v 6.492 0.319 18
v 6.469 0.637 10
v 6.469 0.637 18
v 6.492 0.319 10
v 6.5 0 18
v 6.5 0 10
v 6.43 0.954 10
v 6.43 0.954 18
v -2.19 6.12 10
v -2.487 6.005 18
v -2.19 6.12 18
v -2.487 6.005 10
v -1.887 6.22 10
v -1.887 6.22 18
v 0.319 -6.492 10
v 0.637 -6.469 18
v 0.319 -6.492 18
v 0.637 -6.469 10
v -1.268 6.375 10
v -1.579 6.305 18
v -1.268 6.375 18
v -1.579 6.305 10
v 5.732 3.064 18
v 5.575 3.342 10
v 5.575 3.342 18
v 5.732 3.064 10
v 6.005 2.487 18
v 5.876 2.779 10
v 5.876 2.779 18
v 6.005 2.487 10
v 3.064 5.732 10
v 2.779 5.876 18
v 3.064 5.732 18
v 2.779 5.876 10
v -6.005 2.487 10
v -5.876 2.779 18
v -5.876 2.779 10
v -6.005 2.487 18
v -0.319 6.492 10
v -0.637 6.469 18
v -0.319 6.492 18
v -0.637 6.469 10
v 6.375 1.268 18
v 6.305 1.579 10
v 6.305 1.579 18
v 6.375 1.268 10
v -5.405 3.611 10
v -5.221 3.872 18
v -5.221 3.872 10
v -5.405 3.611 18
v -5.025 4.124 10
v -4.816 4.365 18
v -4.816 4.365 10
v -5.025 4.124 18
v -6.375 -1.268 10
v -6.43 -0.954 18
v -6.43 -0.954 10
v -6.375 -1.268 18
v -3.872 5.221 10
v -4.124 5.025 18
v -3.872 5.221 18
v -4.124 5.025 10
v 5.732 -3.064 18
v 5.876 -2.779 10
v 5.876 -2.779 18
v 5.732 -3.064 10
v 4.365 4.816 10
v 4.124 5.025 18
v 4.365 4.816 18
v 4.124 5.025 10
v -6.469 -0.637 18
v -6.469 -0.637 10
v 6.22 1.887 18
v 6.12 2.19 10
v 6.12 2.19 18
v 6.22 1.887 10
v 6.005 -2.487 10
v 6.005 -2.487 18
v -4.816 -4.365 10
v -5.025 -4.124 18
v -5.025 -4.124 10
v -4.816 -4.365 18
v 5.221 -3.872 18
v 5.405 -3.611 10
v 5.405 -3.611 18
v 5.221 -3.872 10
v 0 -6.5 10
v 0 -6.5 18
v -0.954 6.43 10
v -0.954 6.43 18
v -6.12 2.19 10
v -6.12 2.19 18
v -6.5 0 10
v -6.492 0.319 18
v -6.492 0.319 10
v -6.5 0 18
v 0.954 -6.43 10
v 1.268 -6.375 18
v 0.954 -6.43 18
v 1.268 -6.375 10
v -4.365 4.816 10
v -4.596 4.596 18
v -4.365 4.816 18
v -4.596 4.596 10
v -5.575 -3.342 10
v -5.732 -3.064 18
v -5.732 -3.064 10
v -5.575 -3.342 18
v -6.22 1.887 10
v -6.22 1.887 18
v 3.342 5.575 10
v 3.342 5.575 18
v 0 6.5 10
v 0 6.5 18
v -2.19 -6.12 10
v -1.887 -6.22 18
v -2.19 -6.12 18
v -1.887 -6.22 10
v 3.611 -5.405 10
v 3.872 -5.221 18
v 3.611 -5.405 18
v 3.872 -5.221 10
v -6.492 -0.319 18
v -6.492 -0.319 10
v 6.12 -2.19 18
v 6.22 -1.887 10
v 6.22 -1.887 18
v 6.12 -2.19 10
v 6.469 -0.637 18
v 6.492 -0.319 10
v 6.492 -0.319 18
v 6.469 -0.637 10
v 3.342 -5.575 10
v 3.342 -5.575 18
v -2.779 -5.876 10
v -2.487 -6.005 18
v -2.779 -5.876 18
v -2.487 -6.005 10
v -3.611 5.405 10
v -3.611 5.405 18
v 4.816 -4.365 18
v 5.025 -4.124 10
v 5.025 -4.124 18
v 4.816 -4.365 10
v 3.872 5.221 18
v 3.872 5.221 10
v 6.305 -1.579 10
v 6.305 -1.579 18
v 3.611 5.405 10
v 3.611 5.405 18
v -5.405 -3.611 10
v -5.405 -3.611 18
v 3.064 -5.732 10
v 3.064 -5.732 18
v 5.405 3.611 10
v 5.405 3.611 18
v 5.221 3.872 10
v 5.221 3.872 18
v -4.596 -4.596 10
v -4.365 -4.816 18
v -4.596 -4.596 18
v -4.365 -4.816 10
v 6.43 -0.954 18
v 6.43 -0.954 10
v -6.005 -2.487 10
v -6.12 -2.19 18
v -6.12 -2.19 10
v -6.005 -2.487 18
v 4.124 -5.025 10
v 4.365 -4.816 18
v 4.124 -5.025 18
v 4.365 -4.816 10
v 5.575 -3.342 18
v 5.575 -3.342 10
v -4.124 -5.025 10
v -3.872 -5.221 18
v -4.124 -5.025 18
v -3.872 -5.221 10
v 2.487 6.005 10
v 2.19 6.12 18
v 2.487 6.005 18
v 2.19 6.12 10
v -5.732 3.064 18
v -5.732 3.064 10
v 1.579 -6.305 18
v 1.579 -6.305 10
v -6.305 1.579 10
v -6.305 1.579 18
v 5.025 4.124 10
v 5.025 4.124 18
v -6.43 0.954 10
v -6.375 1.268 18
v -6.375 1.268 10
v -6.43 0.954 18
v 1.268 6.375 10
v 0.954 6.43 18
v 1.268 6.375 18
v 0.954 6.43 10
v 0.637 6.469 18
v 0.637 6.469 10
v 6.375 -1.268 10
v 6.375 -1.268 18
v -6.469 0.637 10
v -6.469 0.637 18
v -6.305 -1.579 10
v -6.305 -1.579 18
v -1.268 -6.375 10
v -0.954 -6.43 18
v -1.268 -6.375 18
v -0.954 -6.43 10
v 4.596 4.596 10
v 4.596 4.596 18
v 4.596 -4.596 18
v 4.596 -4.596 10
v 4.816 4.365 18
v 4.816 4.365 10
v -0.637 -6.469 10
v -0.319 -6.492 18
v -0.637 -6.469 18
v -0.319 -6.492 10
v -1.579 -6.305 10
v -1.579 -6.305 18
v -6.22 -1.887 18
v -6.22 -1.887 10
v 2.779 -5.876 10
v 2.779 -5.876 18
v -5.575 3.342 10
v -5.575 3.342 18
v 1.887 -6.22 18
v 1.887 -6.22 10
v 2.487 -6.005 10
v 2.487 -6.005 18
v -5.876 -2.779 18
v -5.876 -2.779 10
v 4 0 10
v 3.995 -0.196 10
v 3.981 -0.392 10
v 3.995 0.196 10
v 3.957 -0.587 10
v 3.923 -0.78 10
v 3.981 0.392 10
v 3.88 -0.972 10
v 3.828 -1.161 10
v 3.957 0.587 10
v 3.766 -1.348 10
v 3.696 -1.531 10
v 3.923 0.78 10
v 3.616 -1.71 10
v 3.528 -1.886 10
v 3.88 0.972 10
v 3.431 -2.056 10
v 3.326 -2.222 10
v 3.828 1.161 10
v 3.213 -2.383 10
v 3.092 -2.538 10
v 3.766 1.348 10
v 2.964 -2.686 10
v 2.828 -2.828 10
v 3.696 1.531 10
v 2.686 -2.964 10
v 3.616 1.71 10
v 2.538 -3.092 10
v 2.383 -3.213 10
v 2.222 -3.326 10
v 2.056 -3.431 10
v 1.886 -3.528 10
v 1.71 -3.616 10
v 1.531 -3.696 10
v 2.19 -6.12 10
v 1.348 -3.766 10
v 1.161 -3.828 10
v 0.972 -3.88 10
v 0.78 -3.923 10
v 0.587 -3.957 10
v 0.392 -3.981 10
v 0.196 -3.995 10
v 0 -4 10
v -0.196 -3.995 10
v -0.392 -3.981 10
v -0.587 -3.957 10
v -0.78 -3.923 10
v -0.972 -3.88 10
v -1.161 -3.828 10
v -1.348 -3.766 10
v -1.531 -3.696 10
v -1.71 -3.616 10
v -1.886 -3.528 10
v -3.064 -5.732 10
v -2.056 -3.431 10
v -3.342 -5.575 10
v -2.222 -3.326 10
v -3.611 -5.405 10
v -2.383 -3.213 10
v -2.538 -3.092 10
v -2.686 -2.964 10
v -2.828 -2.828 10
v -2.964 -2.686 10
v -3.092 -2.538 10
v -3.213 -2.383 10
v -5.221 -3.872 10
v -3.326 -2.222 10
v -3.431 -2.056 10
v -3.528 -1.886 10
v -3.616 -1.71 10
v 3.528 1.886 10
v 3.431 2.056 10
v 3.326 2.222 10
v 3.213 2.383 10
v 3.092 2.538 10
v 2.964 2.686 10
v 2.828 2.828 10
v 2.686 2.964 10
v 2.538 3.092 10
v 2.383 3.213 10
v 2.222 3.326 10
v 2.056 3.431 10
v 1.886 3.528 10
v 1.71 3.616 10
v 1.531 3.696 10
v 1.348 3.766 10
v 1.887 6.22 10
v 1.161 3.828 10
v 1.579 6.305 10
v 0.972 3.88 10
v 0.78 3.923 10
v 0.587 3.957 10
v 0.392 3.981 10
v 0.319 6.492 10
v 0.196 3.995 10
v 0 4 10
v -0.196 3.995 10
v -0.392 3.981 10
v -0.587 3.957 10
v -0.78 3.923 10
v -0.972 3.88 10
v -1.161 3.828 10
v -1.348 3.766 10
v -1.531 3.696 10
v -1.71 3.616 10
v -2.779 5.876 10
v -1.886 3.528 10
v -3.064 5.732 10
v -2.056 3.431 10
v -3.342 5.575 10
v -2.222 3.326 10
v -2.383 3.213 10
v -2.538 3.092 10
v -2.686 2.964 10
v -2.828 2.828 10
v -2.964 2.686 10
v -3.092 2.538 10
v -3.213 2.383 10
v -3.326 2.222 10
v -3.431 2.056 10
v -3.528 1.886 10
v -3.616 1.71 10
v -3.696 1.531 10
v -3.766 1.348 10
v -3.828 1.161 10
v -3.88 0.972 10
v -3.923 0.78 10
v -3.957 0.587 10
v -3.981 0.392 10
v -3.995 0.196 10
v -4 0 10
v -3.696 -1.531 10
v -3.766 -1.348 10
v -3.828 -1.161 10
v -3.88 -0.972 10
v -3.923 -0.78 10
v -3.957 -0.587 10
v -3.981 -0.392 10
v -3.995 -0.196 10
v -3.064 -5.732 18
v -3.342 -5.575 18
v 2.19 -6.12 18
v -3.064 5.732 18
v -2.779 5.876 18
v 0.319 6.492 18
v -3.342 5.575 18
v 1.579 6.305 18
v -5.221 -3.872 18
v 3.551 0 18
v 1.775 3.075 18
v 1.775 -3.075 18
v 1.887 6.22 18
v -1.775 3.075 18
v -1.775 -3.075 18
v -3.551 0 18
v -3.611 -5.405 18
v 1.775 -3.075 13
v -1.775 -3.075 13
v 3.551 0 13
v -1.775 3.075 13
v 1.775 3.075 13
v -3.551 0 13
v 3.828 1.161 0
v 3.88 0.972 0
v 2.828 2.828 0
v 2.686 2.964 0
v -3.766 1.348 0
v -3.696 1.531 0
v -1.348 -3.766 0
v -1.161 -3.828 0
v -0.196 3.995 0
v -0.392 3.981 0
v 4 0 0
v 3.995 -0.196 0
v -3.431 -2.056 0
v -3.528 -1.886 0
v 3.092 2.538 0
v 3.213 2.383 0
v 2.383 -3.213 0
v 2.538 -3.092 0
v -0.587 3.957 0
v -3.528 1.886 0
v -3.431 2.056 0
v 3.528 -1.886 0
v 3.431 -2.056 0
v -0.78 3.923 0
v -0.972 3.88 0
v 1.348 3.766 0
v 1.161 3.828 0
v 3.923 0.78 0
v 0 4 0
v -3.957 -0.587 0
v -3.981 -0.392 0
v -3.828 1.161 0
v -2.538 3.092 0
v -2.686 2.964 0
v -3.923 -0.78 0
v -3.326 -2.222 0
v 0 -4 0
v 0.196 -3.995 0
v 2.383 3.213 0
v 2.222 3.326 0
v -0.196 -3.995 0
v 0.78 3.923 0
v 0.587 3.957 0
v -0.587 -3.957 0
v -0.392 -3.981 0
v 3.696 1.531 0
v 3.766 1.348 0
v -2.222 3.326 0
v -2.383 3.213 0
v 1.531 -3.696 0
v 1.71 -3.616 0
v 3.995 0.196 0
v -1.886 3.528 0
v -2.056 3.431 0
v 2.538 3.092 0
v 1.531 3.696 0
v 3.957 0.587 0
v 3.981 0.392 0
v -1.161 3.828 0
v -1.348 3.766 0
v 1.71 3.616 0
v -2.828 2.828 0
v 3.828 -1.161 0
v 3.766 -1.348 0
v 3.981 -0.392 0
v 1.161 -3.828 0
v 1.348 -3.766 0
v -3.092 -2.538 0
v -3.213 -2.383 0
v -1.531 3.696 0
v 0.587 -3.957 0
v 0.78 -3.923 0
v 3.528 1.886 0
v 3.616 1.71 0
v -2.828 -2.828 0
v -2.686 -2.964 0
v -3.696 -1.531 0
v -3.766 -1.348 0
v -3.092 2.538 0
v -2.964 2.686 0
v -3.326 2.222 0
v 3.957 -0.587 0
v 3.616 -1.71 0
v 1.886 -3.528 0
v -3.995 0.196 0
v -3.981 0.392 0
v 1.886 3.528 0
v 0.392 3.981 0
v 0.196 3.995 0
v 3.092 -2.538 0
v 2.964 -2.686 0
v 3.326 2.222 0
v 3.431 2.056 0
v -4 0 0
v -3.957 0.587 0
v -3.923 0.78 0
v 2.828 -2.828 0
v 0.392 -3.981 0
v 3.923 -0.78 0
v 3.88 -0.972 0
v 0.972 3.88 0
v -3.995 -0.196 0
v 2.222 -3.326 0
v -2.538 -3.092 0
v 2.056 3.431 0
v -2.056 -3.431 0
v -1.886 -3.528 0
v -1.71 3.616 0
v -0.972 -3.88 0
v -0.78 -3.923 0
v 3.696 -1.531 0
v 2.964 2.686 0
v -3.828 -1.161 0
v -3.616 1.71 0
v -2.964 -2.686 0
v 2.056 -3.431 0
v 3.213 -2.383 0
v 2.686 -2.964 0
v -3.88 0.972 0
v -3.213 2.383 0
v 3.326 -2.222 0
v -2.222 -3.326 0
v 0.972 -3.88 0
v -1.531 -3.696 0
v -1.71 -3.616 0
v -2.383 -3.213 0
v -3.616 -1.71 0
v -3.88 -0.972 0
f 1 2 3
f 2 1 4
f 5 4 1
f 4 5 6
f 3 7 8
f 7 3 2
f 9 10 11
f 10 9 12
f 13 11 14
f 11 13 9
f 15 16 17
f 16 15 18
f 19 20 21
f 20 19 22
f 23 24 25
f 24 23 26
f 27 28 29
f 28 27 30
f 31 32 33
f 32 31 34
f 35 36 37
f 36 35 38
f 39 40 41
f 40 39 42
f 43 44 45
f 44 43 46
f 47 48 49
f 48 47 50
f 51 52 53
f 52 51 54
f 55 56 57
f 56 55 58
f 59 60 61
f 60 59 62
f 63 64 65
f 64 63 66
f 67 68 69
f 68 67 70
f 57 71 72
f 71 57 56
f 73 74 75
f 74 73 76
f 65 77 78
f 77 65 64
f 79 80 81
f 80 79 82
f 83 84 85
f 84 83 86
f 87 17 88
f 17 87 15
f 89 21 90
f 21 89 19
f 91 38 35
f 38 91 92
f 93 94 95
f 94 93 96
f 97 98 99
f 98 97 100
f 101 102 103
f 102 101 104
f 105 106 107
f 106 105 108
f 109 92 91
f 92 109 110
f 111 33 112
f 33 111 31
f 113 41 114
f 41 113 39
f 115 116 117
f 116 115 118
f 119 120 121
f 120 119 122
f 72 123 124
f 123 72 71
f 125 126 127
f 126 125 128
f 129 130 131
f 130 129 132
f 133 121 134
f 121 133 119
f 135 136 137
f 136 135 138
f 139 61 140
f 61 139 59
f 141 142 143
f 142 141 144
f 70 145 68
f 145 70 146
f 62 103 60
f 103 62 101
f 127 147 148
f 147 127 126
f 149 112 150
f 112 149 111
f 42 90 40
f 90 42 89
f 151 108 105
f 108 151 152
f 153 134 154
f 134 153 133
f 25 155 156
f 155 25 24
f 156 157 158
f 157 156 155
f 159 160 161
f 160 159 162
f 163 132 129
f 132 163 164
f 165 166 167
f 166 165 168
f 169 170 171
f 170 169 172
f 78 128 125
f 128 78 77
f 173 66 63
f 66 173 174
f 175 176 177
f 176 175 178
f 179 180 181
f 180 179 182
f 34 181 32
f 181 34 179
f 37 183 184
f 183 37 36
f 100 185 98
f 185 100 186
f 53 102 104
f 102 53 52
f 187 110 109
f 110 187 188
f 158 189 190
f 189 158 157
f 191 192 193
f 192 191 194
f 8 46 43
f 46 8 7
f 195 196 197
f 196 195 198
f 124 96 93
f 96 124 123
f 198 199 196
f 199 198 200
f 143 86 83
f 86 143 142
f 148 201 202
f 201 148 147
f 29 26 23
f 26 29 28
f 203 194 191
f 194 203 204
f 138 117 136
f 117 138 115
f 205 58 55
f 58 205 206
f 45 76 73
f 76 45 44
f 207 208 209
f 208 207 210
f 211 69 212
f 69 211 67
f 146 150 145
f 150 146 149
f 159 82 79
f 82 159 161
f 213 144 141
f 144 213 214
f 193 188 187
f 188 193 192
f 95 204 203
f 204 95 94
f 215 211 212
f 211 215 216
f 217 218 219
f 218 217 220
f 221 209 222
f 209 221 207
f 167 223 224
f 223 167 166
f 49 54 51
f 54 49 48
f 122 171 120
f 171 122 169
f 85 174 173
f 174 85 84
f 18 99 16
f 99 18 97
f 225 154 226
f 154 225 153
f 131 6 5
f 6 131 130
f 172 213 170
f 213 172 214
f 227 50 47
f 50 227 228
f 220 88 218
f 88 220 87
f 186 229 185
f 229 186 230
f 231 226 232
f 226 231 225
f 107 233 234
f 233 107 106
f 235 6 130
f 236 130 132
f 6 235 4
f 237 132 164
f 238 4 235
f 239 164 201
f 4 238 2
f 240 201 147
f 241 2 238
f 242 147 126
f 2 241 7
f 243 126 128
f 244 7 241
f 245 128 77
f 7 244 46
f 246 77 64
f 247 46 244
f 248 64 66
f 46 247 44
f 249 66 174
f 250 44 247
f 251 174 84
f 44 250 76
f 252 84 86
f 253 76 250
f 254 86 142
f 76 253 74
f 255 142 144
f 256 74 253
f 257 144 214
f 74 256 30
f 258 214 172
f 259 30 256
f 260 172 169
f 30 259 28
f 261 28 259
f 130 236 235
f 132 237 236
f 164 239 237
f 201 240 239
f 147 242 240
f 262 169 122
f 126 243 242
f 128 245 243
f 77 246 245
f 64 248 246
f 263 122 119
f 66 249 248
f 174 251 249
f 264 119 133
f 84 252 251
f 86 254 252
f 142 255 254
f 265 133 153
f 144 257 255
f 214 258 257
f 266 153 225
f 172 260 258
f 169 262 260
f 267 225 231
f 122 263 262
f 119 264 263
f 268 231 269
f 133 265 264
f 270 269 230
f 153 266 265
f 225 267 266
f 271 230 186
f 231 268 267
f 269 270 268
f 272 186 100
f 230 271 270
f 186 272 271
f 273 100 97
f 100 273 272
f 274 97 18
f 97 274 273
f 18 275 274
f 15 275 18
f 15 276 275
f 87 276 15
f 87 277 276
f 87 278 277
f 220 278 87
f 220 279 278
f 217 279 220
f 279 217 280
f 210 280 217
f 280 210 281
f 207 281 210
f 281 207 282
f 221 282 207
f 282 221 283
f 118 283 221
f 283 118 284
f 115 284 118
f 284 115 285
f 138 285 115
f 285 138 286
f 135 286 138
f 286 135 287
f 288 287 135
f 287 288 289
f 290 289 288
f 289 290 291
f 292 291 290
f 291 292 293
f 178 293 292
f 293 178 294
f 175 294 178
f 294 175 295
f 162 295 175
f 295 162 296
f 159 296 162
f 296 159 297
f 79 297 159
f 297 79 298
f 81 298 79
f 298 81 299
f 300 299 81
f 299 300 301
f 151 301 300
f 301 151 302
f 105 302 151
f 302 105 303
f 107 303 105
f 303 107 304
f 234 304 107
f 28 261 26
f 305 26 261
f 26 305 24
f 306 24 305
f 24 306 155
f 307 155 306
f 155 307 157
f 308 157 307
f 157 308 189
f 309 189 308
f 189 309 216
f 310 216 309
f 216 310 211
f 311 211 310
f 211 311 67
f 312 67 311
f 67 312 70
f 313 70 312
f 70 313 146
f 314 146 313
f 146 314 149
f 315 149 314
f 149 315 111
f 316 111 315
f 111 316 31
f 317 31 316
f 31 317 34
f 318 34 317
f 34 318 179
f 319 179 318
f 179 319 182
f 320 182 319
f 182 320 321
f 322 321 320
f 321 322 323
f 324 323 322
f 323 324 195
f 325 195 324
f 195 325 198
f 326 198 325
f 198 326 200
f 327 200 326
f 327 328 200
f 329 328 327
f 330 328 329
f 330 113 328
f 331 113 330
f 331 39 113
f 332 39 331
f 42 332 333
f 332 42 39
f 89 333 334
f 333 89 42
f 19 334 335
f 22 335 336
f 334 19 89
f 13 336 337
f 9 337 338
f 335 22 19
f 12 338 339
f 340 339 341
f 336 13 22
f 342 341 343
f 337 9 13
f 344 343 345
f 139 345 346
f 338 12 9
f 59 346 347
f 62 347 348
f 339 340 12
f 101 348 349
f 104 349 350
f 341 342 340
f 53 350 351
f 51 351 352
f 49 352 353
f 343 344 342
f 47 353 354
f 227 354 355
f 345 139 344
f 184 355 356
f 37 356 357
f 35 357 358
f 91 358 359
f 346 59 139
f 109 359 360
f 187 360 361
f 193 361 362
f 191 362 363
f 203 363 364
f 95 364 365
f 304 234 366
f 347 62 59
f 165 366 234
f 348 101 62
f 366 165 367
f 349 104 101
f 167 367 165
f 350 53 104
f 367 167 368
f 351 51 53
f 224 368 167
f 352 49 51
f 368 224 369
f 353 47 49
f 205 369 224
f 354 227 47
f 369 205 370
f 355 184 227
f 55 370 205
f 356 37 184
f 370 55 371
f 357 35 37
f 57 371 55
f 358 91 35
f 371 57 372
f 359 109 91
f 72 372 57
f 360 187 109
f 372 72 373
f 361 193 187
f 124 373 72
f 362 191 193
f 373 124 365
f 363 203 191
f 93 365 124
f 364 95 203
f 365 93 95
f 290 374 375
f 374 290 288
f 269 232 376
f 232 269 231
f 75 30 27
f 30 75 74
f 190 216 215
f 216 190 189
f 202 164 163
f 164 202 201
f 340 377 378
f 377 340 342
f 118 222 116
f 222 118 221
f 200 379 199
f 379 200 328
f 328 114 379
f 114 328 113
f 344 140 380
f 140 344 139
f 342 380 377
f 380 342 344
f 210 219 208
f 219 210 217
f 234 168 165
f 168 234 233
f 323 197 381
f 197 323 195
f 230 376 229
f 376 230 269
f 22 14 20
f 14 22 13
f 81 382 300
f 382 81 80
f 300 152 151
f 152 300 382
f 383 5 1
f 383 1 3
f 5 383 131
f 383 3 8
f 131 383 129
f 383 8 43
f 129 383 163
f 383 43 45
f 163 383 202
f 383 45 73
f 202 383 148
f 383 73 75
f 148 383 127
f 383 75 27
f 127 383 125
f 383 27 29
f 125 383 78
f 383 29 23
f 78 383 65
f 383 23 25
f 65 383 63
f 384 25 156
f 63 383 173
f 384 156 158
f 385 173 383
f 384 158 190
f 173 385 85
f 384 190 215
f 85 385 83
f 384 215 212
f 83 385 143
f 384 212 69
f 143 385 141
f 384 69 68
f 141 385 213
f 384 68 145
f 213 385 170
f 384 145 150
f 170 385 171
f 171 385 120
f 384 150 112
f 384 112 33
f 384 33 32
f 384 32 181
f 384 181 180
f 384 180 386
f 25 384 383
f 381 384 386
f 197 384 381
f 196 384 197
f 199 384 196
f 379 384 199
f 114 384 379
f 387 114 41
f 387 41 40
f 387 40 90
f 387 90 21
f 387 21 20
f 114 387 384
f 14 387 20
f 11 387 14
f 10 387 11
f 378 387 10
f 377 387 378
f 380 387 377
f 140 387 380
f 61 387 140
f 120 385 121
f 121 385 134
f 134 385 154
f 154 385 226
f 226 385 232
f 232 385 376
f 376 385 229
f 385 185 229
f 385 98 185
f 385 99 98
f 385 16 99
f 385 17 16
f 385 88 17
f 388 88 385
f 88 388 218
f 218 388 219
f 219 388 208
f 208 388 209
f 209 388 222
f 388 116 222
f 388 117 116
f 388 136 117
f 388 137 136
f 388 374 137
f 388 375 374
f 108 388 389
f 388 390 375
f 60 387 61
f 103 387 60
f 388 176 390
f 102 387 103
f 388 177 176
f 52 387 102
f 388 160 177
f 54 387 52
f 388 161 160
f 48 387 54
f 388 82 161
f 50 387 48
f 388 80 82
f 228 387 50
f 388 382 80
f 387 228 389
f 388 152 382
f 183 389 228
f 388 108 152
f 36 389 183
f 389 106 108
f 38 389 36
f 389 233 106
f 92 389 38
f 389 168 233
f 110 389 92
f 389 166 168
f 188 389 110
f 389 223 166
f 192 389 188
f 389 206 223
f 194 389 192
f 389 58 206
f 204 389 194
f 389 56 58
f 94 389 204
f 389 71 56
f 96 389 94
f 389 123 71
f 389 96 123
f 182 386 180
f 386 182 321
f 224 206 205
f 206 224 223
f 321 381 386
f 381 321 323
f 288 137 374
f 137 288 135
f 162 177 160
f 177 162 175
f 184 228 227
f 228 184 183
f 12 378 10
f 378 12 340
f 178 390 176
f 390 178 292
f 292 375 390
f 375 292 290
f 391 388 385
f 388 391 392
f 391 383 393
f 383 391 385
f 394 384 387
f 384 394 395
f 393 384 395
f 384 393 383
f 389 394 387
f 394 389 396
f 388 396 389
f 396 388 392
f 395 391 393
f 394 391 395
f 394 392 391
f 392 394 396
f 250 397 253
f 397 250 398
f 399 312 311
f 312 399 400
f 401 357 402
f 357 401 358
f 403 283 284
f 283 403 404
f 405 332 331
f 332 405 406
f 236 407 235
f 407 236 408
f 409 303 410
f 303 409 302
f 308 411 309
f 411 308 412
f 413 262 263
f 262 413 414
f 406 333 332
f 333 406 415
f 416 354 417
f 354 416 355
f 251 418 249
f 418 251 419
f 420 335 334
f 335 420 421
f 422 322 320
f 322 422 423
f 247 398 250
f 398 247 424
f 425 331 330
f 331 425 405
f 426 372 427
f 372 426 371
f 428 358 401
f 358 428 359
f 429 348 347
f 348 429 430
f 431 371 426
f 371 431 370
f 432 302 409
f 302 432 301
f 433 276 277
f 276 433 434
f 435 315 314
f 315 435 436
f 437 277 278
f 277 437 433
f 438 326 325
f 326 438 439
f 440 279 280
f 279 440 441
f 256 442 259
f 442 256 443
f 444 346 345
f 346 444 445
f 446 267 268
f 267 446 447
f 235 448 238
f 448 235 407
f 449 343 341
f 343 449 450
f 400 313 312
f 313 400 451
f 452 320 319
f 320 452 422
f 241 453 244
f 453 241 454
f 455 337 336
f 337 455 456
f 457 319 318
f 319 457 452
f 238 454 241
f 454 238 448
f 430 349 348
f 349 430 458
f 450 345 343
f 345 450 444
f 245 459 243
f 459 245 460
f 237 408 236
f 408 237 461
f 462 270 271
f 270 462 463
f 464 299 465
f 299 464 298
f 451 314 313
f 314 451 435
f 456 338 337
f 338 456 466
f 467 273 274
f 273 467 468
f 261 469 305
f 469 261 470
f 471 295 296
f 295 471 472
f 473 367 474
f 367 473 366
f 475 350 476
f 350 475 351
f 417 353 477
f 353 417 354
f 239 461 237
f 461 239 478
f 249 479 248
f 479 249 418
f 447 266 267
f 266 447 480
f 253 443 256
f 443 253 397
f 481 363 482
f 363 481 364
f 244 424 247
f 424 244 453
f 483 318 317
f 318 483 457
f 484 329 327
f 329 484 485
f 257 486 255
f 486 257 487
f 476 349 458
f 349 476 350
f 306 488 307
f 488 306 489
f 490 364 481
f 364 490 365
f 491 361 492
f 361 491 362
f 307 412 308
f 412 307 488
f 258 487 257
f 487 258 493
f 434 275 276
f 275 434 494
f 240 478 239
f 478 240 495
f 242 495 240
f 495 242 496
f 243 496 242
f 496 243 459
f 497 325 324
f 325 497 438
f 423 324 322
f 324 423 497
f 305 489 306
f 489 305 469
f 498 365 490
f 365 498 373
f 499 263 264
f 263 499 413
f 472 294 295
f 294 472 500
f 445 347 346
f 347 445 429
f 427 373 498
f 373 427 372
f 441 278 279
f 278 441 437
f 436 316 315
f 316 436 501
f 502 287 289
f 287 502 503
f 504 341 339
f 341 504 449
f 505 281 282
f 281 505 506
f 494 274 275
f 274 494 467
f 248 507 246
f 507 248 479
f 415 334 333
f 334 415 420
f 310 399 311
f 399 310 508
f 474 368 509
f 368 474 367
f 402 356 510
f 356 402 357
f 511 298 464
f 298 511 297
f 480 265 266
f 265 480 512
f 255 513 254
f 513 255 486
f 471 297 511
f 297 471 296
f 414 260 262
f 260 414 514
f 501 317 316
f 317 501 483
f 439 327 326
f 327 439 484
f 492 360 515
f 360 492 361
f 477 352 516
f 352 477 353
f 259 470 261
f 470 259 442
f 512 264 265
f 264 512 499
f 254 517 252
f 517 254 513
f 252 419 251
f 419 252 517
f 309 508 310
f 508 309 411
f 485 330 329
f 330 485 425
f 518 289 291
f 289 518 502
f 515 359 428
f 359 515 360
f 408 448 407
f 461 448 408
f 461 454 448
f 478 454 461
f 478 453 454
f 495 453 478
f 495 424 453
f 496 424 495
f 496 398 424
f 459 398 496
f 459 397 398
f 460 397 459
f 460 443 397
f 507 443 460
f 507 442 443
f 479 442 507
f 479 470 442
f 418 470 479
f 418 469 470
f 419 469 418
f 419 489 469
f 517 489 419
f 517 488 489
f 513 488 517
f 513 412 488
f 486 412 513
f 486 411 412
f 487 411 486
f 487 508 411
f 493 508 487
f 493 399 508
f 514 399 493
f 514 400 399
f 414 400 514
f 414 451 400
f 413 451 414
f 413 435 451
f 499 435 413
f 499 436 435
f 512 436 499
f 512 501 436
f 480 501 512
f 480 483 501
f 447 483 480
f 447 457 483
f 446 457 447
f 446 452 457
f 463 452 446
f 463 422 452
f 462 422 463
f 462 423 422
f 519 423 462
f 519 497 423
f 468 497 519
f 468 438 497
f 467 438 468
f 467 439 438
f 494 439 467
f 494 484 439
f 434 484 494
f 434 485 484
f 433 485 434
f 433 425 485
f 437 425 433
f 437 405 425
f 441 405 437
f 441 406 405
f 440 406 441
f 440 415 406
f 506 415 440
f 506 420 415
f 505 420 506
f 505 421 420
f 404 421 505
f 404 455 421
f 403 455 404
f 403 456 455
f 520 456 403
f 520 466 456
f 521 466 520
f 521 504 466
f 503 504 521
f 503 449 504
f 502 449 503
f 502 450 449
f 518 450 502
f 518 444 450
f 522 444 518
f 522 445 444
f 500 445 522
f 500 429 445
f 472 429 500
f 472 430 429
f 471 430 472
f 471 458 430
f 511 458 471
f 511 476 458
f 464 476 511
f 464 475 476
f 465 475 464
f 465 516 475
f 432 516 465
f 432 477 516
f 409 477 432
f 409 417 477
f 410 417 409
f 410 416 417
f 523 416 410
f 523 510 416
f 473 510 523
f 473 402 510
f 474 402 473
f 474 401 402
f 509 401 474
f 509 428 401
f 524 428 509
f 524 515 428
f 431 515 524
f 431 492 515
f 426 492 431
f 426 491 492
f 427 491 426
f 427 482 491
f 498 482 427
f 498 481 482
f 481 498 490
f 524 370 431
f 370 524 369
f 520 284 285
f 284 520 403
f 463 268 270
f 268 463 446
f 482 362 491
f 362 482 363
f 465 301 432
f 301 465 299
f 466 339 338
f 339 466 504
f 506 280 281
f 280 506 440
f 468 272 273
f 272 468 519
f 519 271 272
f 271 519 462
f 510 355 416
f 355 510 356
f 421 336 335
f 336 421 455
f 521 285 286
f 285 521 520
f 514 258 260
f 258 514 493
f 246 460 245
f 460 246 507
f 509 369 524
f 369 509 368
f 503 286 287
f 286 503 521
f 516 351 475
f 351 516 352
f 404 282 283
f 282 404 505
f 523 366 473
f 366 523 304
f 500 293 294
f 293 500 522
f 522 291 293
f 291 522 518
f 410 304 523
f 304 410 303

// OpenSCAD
$fn=128;

// Socket Head Cap Screw (approximate)
// Shank diameter: 8.0 mm
// Head diameter: 13.0 mm
// Head height: 8.0 mm
// Length under head: 10.0 mm

d_shank = 8.0;
d_head  = 13.0;
h_head  = 8.0;
L       = 10.0;

// Hex socket (approximate for M8 SHCS: 6 mm across flats)
hex_af = 6.0;
hex_depth = 5.0;          // typical socket depth
hex_clear = 0.15;         // clearance for rendering/fit

// Small edge chamfers (visual)
chamfer = 0.6;

module hex_prism(af, h){
    // Regular hex with given across-flats (af)
    // For a regular hex, circumradius R = af / sqrt(3)
    R = af / sqrt(3);
    cylinder(h=h, r=R, $fn=6);
}

module shank(){
    cylinder(h=L, d=d_shank);
}

module head(){
    // Head with slight top chamfer and under-head fillet-ish chamfer
    difference(){
        union(){
            // Main head body
            cylinder(h=h_head, d=d_head);

            // Under-head chamfer (adds a tiny flare to avoid sharp edge)
            translate([0,0,0])
                cylinder(h=chamfer, d1=d_head, d2=d_head-2*chamfer);

            // Top chamfer (reduces top edge)
            translate([0,0,h_head-chamfer])
                cylinder(h=chamfer, d1=d_head-2*chamfer, d2=d_head);
        }

        // Hex socket cut
        translate([0,0,h_head-hex_depth])
            hex_prism(hex_af + hex_clear, hex_depth + 0.2);
    }
}

union(){
    // Shank from z=0 to z=L
    shank();

    // Head sits on top of shank
    translate([0,0,L])
        head();
}
